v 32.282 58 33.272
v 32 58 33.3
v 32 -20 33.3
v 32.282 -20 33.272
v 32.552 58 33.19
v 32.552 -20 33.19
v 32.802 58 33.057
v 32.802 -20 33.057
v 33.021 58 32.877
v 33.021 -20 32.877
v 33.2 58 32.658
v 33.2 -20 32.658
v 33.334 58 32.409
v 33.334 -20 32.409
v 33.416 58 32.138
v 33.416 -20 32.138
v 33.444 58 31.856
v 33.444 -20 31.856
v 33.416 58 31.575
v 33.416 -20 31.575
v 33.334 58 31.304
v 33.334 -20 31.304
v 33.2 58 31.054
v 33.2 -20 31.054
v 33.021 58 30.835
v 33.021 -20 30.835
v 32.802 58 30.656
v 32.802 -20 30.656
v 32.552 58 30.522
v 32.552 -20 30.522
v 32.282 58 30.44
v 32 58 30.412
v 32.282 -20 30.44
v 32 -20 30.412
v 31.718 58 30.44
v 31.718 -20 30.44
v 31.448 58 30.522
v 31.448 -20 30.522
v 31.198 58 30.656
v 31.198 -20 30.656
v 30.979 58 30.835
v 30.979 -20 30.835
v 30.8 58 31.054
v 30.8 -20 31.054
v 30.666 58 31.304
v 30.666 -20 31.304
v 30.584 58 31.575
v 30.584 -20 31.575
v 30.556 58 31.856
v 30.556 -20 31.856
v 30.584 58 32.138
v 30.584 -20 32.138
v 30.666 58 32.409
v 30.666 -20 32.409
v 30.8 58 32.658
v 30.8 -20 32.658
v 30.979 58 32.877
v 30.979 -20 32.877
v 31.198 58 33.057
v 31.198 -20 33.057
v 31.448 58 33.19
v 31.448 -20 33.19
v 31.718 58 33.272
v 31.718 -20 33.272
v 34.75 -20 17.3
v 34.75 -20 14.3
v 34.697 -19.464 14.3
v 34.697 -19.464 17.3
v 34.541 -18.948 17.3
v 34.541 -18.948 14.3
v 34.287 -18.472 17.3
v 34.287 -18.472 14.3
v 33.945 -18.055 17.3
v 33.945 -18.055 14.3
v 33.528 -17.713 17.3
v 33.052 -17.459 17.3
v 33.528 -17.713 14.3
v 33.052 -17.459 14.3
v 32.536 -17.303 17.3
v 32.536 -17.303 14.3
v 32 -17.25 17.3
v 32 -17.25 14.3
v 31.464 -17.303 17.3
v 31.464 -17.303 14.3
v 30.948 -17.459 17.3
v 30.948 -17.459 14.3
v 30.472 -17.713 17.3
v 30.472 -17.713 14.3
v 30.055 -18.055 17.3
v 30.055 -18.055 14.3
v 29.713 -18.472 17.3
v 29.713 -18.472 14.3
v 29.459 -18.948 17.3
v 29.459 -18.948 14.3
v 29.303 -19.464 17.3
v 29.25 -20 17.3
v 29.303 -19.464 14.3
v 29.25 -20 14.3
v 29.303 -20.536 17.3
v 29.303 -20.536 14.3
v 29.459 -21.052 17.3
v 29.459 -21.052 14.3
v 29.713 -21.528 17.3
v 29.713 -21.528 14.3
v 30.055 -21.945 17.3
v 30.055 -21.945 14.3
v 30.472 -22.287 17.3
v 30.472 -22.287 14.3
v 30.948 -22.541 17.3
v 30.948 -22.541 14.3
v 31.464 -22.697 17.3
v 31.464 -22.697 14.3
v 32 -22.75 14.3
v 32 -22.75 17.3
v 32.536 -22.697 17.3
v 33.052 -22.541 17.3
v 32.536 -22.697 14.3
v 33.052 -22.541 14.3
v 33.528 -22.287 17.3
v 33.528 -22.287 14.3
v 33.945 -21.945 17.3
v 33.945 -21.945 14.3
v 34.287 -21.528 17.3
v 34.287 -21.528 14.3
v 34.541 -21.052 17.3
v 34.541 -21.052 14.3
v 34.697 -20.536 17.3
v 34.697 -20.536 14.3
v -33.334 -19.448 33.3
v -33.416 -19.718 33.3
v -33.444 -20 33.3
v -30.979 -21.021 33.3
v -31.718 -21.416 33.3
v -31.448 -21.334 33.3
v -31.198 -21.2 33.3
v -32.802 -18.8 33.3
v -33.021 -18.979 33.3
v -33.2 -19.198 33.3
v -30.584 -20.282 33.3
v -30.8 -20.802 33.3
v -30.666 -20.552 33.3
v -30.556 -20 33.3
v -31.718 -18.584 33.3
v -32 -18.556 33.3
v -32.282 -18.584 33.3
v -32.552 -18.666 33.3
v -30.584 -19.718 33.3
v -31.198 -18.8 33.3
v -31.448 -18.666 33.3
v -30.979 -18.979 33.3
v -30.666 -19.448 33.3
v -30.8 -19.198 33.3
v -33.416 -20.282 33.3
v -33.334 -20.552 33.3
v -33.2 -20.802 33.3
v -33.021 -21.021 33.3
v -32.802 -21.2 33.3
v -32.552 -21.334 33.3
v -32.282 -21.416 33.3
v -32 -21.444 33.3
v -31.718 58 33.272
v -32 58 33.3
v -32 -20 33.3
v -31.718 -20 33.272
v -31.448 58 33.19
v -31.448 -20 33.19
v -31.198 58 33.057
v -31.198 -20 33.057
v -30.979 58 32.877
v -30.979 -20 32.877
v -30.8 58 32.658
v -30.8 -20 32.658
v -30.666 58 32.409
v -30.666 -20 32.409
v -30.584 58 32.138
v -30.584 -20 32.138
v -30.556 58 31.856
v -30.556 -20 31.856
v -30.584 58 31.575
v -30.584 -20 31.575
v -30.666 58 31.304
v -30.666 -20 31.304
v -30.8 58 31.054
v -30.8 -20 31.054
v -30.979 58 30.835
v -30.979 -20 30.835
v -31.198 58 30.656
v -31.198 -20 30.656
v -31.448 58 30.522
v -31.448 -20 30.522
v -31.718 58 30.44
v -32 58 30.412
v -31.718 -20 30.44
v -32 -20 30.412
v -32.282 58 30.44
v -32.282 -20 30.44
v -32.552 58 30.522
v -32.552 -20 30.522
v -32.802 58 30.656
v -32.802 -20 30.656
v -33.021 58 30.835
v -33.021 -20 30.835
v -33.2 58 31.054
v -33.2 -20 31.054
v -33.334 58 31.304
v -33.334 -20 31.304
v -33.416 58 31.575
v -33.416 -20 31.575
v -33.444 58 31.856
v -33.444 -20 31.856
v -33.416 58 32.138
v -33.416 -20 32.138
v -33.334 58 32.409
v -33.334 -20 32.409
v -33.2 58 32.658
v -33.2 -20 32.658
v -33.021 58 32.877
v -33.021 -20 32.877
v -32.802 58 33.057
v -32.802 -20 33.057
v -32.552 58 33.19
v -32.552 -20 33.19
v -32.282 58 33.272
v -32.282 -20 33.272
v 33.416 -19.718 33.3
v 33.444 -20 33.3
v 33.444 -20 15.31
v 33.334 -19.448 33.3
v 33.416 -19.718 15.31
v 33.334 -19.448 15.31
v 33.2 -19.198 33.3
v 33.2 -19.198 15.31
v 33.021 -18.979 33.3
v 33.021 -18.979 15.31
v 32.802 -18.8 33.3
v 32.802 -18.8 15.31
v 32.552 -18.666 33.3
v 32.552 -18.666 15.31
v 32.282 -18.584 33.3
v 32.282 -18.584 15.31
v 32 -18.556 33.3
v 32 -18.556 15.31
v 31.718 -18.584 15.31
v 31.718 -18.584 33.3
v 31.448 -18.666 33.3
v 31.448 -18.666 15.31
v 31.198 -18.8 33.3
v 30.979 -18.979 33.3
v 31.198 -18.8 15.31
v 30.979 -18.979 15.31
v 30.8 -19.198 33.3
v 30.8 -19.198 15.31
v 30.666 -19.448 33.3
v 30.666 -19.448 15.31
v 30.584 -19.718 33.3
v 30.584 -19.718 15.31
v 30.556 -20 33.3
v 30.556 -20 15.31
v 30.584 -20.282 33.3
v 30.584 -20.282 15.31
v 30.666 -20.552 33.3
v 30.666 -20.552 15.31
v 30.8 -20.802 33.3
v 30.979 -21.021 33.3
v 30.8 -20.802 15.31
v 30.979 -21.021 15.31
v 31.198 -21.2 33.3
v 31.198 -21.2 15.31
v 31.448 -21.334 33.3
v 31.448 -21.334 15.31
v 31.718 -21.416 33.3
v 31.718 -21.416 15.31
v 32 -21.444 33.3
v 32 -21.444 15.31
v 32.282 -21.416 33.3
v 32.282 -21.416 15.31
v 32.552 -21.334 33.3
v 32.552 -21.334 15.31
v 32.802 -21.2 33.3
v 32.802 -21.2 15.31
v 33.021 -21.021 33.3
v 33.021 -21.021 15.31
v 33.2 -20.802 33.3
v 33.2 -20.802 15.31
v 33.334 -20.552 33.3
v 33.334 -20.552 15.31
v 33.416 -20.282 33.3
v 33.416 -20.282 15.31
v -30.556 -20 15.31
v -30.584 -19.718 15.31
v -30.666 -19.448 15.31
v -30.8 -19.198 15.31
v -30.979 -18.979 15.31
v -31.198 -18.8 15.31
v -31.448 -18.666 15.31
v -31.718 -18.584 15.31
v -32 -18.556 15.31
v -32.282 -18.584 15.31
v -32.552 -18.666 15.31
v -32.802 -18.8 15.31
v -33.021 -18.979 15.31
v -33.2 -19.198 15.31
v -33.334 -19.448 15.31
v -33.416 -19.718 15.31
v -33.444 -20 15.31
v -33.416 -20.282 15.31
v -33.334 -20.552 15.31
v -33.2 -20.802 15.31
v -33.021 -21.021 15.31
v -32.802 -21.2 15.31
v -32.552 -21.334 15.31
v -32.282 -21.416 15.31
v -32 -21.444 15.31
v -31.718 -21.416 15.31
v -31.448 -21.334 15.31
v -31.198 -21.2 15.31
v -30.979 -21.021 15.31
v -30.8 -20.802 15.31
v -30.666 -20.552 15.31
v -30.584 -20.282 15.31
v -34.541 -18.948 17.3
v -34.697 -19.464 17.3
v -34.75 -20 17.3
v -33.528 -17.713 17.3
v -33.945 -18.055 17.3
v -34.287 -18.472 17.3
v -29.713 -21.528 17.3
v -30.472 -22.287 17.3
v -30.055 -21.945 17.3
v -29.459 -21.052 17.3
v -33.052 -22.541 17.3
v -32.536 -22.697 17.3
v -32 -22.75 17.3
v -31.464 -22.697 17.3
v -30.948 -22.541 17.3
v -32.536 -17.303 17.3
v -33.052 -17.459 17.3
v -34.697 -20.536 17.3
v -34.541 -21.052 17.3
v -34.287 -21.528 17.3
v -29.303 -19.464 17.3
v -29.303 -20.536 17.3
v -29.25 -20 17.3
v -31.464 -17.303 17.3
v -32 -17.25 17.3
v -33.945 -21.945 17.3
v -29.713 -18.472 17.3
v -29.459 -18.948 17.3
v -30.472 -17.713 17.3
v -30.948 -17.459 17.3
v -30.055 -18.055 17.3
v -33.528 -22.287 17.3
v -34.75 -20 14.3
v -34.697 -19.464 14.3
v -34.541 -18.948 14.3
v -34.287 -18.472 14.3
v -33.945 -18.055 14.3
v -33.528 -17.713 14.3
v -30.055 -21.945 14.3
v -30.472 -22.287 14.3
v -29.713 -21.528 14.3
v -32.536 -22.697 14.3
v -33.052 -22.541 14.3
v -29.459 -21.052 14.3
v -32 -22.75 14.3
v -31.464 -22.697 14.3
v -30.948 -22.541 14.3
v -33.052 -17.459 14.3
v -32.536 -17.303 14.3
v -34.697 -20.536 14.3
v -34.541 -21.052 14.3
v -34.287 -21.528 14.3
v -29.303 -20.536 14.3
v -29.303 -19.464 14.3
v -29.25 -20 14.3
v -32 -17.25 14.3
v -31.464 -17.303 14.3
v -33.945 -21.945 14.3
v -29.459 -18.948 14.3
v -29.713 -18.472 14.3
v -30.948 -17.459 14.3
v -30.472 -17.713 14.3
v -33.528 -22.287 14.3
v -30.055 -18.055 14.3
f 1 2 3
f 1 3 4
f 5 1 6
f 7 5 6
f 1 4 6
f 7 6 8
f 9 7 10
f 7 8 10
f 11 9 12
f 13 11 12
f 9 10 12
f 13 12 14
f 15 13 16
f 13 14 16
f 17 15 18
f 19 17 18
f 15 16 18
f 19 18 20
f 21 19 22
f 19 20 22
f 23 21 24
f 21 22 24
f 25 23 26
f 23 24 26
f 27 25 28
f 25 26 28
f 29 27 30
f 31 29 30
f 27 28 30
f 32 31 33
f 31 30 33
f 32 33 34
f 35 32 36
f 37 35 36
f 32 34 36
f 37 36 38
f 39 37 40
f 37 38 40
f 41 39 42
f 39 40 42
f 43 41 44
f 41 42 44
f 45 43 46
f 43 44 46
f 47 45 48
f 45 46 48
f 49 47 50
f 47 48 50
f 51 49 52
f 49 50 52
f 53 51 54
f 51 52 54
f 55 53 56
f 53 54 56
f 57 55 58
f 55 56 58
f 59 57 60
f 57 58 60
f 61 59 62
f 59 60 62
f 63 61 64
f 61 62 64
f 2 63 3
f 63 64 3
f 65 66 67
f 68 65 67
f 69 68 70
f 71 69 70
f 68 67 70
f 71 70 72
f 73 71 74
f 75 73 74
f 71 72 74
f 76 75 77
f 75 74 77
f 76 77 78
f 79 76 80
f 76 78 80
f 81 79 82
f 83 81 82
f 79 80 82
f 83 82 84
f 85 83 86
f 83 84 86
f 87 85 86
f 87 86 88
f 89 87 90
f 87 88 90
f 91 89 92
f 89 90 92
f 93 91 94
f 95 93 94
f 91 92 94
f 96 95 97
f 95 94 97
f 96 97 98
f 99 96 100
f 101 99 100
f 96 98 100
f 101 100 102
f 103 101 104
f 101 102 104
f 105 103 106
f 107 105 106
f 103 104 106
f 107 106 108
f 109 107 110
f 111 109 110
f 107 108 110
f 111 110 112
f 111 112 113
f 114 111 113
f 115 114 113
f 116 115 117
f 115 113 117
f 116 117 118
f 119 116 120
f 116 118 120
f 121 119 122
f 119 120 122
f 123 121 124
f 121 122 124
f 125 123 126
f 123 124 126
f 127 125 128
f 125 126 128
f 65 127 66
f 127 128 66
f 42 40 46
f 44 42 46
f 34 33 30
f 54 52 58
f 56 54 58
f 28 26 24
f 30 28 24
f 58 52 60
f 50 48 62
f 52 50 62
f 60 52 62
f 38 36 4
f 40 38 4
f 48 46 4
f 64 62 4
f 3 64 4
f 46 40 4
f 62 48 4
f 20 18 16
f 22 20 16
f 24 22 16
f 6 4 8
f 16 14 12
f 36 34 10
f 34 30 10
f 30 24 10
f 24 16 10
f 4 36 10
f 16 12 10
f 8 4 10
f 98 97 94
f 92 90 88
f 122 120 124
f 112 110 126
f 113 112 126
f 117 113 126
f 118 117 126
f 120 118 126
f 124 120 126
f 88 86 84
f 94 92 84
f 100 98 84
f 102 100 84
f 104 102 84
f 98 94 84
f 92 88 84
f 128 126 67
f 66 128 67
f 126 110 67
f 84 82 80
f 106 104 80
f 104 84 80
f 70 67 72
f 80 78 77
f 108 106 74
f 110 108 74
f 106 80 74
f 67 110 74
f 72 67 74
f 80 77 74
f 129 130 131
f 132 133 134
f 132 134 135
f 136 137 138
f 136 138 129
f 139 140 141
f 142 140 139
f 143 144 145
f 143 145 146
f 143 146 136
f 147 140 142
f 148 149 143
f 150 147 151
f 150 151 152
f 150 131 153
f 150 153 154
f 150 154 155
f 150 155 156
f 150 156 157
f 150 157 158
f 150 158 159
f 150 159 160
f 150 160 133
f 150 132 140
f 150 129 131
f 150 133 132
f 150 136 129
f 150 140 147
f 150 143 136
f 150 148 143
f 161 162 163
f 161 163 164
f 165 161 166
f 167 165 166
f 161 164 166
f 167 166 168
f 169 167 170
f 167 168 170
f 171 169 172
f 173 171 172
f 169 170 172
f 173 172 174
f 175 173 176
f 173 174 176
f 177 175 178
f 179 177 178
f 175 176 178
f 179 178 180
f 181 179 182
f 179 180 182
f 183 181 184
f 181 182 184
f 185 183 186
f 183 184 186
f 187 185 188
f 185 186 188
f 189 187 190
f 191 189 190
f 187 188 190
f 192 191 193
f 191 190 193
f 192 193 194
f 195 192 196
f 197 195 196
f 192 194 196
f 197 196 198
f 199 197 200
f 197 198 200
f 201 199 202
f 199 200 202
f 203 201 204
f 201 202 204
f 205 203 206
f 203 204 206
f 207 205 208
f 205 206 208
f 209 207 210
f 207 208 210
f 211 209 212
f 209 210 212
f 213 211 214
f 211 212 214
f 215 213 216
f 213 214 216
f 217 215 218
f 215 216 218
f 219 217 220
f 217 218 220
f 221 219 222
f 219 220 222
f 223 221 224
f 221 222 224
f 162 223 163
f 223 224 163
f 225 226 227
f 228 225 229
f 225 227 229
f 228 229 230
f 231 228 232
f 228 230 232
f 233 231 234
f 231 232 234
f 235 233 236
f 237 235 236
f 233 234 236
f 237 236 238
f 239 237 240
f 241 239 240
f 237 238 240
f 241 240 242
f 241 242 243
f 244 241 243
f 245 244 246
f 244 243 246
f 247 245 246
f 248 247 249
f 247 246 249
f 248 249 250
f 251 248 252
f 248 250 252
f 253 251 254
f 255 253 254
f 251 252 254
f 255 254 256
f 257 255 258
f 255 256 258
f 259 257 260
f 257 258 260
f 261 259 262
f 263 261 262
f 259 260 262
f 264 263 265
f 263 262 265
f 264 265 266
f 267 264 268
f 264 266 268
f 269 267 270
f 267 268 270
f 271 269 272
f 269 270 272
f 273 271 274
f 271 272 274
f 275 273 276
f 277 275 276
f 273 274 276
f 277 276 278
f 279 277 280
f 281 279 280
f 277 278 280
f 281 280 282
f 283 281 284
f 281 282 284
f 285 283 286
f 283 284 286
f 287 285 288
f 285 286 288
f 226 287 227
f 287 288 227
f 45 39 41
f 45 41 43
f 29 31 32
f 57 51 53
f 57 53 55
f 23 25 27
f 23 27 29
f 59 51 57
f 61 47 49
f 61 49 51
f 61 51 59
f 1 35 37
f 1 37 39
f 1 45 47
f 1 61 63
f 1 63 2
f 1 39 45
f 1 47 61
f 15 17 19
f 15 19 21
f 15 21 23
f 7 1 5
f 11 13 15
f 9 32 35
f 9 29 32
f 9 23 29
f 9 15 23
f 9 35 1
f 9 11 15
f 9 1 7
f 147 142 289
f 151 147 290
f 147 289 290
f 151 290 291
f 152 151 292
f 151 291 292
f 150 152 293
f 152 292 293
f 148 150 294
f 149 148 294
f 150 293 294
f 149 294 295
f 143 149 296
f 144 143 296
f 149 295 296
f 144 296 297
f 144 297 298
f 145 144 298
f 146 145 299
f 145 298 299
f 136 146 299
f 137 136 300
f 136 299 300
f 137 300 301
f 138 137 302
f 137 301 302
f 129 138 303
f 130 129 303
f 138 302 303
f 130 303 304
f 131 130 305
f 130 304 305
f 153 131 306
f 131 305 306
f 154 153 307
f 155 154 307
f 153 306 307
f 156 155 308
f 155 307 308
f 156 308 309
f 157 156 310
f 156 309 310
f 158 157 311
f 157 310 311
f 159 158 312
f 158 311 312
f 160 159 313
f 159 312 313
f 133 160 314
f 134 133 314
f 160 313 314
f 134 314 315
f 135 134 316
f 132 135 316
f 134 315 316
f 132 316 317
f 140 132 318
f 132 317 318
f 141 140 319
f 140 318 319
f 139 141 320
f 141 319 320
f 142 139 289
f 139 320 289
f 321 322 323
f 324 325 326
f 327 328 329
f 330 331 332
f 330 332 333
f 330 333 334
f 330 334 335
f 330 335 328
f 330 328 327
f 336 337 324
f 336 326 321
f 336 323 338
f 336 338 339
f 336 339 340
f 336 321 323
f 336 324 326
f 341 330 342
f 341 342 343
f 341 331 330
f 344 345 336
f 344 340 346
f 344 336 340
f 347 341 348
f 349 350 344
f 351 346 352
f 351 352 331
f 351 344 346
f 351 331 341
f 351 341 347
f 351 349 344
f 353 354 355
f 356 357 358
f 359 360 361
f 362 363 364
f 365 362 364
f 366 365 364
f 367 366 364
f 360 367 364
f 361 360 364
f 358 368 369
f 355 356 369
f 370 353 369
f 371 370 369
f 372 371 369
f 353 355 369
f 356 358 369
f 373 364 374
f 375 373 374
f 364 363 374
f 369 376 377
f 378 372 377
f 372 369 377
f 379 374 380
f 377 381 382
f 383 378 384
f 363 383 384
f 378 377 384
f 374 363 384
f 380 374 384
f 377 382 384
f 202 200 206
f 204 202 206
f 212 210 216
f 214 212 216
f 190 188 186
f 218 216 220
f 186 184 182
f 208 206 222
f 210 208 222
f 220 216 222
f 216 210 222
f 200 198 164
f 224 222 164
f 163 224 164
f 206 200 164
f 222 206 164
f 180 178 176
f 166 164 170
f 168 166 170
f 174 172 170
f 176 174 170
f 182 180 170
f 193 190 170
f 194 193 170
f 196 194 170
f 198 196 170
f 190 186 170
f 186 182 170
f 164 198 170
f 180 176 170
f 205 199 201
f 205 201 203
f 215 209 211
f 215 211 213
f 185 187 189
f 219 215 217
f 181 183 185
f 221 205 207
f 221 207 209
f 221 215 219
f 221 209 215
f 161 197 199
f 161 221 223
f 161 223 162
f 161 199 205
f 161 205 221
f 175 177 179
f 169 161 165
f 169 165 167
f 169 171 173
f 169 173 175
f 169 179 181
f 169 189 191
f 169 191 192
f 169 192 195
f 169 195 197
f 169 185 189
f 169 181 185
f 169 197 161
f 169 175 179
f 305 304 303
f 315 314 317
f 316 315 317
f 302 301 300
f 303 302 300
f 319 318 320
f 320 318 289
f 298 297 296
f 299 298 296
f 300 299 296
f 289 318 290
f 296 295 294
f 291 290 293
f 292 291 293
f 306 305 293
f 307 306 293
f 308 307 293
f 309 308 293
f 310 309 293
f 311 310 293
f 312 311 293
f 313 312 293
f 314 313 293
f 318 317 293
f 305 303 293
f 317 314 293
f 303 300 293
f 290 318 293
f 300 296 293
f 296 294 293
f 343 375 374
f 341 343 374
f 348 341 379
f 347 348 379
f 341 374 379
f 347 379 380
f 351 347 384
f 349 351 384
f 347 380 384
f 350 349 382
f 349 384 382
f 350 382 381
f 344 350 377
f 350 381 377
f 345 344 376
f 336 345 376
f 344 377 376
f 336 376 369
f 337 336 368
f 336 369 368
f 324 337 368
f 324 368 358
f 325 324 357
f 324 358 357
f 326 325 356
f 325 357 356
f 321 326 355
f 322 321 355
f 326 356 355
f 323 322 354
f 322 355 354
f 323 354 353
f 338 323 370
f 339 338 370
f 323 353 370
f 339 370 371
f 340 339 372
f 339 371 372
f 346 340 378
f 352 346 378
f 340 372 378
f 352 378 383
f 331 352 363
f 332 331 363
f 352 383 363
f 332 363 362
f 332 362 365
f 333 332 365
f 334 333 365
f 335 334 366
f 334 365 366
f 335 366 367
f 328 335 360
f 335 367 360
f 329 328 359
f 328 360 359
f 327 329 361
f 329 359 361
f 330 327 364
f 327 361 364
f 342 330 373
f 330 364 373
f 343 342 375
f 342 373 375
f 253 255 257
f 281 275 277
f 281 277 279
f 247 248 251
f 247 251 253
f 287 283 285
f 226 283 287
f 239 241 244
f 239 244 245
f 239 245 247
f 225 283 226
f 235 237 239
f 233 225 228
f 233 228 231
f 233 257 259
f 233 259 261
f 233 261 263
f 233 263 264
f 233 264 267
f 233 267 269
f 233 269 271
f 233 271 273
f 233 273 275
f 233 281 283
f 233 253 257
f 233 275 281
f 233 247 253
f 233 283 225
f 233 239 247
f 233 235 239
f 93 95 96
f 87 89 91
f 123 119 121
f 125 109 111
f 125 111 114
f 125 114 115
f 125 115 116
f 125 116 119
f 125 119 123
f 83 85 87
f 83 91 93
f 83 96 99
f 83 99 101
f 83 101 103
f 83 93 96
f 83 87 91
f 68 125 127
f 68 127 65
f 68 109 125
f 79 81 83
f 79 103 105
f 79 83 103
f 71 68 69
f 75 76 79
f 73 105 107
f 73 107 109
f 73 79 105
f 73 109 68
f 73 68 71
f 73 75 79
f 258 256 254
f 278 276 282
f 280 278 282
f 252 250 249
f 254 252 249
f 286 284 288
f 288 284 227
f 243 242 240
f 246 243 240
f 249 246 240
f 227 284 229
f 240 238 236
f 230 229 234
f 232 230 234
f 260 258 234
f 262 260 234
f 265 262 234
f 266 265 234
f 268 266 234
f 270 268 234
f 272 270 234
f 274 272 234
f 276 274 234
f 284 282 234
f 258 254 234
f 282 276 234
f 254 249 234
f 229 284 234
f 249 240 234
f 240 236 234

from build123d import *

# Parameters (mm, degrees)
SKETCH1_R                = 2.75
BOLT_HEAD_32_DEPTH       = 3
SKETCH2_R                = 1.44375
KEY_SHORT_ARM_32_DEPTH   = 17.99
SKETCH3_R                = 1.44375
KEY_LONG_ARM_32_DEPTH    = 78
SKETCH4_R                = 2.75
BOLT_HEAD_32_2_DEPTH     = 3
SKETCH5_R                = 1.44375
KEY_SHORT_ARM_32_2_DEPTH = 17.99
SKETCH6_R                = 1.44375
KEY_LONG_ARM_32_2_DEPTH  = 78


with BuildPart() as part:
    # Sketch1 → Bolt Head -32 (new body)
    with BuildSketch(Plane.XY.offset(14.3)):
        with Locations((-32, -20)):
            Circle(SKETCH1_R)
    extrude(amount=BOLT_HEAD_32_DEPTH)


with BuildPart() as body_2:
    # Sketch2 → Key Short Arm -32 (new body)
    with BuildSketch(Plane.XY.offset(15.31)):
        with Locations((-32, -20)):
            Circle(SKETCH2_R)
    extrude(amount=KEY_SHORT_ARM_32_DEPTH)


with BuildPart() as body_3:
    # Sketch3 → Key Long Arm -32 (new body)
    with BuildSketch(Plane(origin=(0, -20, 0), x_dir=(1, 0, 0), z_dir=(0, 1, 0))):
        with Locations(Location((-32, -31.85625, 0), (0, 0, 270))):
            Circle(SKETCH3_R)
    extrude(amount=KEY_LONG_ARM_32_DEPTH)


with BuildPart() as body_4:
    # Sketch4 → Bolt Head _32 2 (new body)
    with BuildSketch(Plane.XY.offset(14.3)):
        with Locations((32, -20)):
            Circle(SKETCH4_R)
    extrude(amount=BOLT_HEAD_32_2_DEPTH)


with BuildPart() as body_5:
    # Sketch5 → Key Short Arm _32 2 (new body)
    with BuildSketch(Plane.XY.offset(15.31)):
        with Locations((32, -20)):
            Circle(SKETCH5_R)
    extrude(amount=KEY_SHORT_ARM_32_2_DEPTH)


with BuildPart() as body_6:
    # Sketch6 → Key Long Arm _32 2 (new body)
    with BuildSketch(Plane(origin=(0, -20, 0), x_dir=(1, 0, 0), z_dir=(0, 1, 0))):
        with Locations(Location((32, -31.85625, 0), (0, 0, 270))):
            Circle(SKETCH6_R)
    extrude(amount=KEY_LONG_ARM_32_2_DEPTH)


solid = Compound([part.part, body_2.part, body_3.part, body_4.part, body_5.part, body_6.part])
